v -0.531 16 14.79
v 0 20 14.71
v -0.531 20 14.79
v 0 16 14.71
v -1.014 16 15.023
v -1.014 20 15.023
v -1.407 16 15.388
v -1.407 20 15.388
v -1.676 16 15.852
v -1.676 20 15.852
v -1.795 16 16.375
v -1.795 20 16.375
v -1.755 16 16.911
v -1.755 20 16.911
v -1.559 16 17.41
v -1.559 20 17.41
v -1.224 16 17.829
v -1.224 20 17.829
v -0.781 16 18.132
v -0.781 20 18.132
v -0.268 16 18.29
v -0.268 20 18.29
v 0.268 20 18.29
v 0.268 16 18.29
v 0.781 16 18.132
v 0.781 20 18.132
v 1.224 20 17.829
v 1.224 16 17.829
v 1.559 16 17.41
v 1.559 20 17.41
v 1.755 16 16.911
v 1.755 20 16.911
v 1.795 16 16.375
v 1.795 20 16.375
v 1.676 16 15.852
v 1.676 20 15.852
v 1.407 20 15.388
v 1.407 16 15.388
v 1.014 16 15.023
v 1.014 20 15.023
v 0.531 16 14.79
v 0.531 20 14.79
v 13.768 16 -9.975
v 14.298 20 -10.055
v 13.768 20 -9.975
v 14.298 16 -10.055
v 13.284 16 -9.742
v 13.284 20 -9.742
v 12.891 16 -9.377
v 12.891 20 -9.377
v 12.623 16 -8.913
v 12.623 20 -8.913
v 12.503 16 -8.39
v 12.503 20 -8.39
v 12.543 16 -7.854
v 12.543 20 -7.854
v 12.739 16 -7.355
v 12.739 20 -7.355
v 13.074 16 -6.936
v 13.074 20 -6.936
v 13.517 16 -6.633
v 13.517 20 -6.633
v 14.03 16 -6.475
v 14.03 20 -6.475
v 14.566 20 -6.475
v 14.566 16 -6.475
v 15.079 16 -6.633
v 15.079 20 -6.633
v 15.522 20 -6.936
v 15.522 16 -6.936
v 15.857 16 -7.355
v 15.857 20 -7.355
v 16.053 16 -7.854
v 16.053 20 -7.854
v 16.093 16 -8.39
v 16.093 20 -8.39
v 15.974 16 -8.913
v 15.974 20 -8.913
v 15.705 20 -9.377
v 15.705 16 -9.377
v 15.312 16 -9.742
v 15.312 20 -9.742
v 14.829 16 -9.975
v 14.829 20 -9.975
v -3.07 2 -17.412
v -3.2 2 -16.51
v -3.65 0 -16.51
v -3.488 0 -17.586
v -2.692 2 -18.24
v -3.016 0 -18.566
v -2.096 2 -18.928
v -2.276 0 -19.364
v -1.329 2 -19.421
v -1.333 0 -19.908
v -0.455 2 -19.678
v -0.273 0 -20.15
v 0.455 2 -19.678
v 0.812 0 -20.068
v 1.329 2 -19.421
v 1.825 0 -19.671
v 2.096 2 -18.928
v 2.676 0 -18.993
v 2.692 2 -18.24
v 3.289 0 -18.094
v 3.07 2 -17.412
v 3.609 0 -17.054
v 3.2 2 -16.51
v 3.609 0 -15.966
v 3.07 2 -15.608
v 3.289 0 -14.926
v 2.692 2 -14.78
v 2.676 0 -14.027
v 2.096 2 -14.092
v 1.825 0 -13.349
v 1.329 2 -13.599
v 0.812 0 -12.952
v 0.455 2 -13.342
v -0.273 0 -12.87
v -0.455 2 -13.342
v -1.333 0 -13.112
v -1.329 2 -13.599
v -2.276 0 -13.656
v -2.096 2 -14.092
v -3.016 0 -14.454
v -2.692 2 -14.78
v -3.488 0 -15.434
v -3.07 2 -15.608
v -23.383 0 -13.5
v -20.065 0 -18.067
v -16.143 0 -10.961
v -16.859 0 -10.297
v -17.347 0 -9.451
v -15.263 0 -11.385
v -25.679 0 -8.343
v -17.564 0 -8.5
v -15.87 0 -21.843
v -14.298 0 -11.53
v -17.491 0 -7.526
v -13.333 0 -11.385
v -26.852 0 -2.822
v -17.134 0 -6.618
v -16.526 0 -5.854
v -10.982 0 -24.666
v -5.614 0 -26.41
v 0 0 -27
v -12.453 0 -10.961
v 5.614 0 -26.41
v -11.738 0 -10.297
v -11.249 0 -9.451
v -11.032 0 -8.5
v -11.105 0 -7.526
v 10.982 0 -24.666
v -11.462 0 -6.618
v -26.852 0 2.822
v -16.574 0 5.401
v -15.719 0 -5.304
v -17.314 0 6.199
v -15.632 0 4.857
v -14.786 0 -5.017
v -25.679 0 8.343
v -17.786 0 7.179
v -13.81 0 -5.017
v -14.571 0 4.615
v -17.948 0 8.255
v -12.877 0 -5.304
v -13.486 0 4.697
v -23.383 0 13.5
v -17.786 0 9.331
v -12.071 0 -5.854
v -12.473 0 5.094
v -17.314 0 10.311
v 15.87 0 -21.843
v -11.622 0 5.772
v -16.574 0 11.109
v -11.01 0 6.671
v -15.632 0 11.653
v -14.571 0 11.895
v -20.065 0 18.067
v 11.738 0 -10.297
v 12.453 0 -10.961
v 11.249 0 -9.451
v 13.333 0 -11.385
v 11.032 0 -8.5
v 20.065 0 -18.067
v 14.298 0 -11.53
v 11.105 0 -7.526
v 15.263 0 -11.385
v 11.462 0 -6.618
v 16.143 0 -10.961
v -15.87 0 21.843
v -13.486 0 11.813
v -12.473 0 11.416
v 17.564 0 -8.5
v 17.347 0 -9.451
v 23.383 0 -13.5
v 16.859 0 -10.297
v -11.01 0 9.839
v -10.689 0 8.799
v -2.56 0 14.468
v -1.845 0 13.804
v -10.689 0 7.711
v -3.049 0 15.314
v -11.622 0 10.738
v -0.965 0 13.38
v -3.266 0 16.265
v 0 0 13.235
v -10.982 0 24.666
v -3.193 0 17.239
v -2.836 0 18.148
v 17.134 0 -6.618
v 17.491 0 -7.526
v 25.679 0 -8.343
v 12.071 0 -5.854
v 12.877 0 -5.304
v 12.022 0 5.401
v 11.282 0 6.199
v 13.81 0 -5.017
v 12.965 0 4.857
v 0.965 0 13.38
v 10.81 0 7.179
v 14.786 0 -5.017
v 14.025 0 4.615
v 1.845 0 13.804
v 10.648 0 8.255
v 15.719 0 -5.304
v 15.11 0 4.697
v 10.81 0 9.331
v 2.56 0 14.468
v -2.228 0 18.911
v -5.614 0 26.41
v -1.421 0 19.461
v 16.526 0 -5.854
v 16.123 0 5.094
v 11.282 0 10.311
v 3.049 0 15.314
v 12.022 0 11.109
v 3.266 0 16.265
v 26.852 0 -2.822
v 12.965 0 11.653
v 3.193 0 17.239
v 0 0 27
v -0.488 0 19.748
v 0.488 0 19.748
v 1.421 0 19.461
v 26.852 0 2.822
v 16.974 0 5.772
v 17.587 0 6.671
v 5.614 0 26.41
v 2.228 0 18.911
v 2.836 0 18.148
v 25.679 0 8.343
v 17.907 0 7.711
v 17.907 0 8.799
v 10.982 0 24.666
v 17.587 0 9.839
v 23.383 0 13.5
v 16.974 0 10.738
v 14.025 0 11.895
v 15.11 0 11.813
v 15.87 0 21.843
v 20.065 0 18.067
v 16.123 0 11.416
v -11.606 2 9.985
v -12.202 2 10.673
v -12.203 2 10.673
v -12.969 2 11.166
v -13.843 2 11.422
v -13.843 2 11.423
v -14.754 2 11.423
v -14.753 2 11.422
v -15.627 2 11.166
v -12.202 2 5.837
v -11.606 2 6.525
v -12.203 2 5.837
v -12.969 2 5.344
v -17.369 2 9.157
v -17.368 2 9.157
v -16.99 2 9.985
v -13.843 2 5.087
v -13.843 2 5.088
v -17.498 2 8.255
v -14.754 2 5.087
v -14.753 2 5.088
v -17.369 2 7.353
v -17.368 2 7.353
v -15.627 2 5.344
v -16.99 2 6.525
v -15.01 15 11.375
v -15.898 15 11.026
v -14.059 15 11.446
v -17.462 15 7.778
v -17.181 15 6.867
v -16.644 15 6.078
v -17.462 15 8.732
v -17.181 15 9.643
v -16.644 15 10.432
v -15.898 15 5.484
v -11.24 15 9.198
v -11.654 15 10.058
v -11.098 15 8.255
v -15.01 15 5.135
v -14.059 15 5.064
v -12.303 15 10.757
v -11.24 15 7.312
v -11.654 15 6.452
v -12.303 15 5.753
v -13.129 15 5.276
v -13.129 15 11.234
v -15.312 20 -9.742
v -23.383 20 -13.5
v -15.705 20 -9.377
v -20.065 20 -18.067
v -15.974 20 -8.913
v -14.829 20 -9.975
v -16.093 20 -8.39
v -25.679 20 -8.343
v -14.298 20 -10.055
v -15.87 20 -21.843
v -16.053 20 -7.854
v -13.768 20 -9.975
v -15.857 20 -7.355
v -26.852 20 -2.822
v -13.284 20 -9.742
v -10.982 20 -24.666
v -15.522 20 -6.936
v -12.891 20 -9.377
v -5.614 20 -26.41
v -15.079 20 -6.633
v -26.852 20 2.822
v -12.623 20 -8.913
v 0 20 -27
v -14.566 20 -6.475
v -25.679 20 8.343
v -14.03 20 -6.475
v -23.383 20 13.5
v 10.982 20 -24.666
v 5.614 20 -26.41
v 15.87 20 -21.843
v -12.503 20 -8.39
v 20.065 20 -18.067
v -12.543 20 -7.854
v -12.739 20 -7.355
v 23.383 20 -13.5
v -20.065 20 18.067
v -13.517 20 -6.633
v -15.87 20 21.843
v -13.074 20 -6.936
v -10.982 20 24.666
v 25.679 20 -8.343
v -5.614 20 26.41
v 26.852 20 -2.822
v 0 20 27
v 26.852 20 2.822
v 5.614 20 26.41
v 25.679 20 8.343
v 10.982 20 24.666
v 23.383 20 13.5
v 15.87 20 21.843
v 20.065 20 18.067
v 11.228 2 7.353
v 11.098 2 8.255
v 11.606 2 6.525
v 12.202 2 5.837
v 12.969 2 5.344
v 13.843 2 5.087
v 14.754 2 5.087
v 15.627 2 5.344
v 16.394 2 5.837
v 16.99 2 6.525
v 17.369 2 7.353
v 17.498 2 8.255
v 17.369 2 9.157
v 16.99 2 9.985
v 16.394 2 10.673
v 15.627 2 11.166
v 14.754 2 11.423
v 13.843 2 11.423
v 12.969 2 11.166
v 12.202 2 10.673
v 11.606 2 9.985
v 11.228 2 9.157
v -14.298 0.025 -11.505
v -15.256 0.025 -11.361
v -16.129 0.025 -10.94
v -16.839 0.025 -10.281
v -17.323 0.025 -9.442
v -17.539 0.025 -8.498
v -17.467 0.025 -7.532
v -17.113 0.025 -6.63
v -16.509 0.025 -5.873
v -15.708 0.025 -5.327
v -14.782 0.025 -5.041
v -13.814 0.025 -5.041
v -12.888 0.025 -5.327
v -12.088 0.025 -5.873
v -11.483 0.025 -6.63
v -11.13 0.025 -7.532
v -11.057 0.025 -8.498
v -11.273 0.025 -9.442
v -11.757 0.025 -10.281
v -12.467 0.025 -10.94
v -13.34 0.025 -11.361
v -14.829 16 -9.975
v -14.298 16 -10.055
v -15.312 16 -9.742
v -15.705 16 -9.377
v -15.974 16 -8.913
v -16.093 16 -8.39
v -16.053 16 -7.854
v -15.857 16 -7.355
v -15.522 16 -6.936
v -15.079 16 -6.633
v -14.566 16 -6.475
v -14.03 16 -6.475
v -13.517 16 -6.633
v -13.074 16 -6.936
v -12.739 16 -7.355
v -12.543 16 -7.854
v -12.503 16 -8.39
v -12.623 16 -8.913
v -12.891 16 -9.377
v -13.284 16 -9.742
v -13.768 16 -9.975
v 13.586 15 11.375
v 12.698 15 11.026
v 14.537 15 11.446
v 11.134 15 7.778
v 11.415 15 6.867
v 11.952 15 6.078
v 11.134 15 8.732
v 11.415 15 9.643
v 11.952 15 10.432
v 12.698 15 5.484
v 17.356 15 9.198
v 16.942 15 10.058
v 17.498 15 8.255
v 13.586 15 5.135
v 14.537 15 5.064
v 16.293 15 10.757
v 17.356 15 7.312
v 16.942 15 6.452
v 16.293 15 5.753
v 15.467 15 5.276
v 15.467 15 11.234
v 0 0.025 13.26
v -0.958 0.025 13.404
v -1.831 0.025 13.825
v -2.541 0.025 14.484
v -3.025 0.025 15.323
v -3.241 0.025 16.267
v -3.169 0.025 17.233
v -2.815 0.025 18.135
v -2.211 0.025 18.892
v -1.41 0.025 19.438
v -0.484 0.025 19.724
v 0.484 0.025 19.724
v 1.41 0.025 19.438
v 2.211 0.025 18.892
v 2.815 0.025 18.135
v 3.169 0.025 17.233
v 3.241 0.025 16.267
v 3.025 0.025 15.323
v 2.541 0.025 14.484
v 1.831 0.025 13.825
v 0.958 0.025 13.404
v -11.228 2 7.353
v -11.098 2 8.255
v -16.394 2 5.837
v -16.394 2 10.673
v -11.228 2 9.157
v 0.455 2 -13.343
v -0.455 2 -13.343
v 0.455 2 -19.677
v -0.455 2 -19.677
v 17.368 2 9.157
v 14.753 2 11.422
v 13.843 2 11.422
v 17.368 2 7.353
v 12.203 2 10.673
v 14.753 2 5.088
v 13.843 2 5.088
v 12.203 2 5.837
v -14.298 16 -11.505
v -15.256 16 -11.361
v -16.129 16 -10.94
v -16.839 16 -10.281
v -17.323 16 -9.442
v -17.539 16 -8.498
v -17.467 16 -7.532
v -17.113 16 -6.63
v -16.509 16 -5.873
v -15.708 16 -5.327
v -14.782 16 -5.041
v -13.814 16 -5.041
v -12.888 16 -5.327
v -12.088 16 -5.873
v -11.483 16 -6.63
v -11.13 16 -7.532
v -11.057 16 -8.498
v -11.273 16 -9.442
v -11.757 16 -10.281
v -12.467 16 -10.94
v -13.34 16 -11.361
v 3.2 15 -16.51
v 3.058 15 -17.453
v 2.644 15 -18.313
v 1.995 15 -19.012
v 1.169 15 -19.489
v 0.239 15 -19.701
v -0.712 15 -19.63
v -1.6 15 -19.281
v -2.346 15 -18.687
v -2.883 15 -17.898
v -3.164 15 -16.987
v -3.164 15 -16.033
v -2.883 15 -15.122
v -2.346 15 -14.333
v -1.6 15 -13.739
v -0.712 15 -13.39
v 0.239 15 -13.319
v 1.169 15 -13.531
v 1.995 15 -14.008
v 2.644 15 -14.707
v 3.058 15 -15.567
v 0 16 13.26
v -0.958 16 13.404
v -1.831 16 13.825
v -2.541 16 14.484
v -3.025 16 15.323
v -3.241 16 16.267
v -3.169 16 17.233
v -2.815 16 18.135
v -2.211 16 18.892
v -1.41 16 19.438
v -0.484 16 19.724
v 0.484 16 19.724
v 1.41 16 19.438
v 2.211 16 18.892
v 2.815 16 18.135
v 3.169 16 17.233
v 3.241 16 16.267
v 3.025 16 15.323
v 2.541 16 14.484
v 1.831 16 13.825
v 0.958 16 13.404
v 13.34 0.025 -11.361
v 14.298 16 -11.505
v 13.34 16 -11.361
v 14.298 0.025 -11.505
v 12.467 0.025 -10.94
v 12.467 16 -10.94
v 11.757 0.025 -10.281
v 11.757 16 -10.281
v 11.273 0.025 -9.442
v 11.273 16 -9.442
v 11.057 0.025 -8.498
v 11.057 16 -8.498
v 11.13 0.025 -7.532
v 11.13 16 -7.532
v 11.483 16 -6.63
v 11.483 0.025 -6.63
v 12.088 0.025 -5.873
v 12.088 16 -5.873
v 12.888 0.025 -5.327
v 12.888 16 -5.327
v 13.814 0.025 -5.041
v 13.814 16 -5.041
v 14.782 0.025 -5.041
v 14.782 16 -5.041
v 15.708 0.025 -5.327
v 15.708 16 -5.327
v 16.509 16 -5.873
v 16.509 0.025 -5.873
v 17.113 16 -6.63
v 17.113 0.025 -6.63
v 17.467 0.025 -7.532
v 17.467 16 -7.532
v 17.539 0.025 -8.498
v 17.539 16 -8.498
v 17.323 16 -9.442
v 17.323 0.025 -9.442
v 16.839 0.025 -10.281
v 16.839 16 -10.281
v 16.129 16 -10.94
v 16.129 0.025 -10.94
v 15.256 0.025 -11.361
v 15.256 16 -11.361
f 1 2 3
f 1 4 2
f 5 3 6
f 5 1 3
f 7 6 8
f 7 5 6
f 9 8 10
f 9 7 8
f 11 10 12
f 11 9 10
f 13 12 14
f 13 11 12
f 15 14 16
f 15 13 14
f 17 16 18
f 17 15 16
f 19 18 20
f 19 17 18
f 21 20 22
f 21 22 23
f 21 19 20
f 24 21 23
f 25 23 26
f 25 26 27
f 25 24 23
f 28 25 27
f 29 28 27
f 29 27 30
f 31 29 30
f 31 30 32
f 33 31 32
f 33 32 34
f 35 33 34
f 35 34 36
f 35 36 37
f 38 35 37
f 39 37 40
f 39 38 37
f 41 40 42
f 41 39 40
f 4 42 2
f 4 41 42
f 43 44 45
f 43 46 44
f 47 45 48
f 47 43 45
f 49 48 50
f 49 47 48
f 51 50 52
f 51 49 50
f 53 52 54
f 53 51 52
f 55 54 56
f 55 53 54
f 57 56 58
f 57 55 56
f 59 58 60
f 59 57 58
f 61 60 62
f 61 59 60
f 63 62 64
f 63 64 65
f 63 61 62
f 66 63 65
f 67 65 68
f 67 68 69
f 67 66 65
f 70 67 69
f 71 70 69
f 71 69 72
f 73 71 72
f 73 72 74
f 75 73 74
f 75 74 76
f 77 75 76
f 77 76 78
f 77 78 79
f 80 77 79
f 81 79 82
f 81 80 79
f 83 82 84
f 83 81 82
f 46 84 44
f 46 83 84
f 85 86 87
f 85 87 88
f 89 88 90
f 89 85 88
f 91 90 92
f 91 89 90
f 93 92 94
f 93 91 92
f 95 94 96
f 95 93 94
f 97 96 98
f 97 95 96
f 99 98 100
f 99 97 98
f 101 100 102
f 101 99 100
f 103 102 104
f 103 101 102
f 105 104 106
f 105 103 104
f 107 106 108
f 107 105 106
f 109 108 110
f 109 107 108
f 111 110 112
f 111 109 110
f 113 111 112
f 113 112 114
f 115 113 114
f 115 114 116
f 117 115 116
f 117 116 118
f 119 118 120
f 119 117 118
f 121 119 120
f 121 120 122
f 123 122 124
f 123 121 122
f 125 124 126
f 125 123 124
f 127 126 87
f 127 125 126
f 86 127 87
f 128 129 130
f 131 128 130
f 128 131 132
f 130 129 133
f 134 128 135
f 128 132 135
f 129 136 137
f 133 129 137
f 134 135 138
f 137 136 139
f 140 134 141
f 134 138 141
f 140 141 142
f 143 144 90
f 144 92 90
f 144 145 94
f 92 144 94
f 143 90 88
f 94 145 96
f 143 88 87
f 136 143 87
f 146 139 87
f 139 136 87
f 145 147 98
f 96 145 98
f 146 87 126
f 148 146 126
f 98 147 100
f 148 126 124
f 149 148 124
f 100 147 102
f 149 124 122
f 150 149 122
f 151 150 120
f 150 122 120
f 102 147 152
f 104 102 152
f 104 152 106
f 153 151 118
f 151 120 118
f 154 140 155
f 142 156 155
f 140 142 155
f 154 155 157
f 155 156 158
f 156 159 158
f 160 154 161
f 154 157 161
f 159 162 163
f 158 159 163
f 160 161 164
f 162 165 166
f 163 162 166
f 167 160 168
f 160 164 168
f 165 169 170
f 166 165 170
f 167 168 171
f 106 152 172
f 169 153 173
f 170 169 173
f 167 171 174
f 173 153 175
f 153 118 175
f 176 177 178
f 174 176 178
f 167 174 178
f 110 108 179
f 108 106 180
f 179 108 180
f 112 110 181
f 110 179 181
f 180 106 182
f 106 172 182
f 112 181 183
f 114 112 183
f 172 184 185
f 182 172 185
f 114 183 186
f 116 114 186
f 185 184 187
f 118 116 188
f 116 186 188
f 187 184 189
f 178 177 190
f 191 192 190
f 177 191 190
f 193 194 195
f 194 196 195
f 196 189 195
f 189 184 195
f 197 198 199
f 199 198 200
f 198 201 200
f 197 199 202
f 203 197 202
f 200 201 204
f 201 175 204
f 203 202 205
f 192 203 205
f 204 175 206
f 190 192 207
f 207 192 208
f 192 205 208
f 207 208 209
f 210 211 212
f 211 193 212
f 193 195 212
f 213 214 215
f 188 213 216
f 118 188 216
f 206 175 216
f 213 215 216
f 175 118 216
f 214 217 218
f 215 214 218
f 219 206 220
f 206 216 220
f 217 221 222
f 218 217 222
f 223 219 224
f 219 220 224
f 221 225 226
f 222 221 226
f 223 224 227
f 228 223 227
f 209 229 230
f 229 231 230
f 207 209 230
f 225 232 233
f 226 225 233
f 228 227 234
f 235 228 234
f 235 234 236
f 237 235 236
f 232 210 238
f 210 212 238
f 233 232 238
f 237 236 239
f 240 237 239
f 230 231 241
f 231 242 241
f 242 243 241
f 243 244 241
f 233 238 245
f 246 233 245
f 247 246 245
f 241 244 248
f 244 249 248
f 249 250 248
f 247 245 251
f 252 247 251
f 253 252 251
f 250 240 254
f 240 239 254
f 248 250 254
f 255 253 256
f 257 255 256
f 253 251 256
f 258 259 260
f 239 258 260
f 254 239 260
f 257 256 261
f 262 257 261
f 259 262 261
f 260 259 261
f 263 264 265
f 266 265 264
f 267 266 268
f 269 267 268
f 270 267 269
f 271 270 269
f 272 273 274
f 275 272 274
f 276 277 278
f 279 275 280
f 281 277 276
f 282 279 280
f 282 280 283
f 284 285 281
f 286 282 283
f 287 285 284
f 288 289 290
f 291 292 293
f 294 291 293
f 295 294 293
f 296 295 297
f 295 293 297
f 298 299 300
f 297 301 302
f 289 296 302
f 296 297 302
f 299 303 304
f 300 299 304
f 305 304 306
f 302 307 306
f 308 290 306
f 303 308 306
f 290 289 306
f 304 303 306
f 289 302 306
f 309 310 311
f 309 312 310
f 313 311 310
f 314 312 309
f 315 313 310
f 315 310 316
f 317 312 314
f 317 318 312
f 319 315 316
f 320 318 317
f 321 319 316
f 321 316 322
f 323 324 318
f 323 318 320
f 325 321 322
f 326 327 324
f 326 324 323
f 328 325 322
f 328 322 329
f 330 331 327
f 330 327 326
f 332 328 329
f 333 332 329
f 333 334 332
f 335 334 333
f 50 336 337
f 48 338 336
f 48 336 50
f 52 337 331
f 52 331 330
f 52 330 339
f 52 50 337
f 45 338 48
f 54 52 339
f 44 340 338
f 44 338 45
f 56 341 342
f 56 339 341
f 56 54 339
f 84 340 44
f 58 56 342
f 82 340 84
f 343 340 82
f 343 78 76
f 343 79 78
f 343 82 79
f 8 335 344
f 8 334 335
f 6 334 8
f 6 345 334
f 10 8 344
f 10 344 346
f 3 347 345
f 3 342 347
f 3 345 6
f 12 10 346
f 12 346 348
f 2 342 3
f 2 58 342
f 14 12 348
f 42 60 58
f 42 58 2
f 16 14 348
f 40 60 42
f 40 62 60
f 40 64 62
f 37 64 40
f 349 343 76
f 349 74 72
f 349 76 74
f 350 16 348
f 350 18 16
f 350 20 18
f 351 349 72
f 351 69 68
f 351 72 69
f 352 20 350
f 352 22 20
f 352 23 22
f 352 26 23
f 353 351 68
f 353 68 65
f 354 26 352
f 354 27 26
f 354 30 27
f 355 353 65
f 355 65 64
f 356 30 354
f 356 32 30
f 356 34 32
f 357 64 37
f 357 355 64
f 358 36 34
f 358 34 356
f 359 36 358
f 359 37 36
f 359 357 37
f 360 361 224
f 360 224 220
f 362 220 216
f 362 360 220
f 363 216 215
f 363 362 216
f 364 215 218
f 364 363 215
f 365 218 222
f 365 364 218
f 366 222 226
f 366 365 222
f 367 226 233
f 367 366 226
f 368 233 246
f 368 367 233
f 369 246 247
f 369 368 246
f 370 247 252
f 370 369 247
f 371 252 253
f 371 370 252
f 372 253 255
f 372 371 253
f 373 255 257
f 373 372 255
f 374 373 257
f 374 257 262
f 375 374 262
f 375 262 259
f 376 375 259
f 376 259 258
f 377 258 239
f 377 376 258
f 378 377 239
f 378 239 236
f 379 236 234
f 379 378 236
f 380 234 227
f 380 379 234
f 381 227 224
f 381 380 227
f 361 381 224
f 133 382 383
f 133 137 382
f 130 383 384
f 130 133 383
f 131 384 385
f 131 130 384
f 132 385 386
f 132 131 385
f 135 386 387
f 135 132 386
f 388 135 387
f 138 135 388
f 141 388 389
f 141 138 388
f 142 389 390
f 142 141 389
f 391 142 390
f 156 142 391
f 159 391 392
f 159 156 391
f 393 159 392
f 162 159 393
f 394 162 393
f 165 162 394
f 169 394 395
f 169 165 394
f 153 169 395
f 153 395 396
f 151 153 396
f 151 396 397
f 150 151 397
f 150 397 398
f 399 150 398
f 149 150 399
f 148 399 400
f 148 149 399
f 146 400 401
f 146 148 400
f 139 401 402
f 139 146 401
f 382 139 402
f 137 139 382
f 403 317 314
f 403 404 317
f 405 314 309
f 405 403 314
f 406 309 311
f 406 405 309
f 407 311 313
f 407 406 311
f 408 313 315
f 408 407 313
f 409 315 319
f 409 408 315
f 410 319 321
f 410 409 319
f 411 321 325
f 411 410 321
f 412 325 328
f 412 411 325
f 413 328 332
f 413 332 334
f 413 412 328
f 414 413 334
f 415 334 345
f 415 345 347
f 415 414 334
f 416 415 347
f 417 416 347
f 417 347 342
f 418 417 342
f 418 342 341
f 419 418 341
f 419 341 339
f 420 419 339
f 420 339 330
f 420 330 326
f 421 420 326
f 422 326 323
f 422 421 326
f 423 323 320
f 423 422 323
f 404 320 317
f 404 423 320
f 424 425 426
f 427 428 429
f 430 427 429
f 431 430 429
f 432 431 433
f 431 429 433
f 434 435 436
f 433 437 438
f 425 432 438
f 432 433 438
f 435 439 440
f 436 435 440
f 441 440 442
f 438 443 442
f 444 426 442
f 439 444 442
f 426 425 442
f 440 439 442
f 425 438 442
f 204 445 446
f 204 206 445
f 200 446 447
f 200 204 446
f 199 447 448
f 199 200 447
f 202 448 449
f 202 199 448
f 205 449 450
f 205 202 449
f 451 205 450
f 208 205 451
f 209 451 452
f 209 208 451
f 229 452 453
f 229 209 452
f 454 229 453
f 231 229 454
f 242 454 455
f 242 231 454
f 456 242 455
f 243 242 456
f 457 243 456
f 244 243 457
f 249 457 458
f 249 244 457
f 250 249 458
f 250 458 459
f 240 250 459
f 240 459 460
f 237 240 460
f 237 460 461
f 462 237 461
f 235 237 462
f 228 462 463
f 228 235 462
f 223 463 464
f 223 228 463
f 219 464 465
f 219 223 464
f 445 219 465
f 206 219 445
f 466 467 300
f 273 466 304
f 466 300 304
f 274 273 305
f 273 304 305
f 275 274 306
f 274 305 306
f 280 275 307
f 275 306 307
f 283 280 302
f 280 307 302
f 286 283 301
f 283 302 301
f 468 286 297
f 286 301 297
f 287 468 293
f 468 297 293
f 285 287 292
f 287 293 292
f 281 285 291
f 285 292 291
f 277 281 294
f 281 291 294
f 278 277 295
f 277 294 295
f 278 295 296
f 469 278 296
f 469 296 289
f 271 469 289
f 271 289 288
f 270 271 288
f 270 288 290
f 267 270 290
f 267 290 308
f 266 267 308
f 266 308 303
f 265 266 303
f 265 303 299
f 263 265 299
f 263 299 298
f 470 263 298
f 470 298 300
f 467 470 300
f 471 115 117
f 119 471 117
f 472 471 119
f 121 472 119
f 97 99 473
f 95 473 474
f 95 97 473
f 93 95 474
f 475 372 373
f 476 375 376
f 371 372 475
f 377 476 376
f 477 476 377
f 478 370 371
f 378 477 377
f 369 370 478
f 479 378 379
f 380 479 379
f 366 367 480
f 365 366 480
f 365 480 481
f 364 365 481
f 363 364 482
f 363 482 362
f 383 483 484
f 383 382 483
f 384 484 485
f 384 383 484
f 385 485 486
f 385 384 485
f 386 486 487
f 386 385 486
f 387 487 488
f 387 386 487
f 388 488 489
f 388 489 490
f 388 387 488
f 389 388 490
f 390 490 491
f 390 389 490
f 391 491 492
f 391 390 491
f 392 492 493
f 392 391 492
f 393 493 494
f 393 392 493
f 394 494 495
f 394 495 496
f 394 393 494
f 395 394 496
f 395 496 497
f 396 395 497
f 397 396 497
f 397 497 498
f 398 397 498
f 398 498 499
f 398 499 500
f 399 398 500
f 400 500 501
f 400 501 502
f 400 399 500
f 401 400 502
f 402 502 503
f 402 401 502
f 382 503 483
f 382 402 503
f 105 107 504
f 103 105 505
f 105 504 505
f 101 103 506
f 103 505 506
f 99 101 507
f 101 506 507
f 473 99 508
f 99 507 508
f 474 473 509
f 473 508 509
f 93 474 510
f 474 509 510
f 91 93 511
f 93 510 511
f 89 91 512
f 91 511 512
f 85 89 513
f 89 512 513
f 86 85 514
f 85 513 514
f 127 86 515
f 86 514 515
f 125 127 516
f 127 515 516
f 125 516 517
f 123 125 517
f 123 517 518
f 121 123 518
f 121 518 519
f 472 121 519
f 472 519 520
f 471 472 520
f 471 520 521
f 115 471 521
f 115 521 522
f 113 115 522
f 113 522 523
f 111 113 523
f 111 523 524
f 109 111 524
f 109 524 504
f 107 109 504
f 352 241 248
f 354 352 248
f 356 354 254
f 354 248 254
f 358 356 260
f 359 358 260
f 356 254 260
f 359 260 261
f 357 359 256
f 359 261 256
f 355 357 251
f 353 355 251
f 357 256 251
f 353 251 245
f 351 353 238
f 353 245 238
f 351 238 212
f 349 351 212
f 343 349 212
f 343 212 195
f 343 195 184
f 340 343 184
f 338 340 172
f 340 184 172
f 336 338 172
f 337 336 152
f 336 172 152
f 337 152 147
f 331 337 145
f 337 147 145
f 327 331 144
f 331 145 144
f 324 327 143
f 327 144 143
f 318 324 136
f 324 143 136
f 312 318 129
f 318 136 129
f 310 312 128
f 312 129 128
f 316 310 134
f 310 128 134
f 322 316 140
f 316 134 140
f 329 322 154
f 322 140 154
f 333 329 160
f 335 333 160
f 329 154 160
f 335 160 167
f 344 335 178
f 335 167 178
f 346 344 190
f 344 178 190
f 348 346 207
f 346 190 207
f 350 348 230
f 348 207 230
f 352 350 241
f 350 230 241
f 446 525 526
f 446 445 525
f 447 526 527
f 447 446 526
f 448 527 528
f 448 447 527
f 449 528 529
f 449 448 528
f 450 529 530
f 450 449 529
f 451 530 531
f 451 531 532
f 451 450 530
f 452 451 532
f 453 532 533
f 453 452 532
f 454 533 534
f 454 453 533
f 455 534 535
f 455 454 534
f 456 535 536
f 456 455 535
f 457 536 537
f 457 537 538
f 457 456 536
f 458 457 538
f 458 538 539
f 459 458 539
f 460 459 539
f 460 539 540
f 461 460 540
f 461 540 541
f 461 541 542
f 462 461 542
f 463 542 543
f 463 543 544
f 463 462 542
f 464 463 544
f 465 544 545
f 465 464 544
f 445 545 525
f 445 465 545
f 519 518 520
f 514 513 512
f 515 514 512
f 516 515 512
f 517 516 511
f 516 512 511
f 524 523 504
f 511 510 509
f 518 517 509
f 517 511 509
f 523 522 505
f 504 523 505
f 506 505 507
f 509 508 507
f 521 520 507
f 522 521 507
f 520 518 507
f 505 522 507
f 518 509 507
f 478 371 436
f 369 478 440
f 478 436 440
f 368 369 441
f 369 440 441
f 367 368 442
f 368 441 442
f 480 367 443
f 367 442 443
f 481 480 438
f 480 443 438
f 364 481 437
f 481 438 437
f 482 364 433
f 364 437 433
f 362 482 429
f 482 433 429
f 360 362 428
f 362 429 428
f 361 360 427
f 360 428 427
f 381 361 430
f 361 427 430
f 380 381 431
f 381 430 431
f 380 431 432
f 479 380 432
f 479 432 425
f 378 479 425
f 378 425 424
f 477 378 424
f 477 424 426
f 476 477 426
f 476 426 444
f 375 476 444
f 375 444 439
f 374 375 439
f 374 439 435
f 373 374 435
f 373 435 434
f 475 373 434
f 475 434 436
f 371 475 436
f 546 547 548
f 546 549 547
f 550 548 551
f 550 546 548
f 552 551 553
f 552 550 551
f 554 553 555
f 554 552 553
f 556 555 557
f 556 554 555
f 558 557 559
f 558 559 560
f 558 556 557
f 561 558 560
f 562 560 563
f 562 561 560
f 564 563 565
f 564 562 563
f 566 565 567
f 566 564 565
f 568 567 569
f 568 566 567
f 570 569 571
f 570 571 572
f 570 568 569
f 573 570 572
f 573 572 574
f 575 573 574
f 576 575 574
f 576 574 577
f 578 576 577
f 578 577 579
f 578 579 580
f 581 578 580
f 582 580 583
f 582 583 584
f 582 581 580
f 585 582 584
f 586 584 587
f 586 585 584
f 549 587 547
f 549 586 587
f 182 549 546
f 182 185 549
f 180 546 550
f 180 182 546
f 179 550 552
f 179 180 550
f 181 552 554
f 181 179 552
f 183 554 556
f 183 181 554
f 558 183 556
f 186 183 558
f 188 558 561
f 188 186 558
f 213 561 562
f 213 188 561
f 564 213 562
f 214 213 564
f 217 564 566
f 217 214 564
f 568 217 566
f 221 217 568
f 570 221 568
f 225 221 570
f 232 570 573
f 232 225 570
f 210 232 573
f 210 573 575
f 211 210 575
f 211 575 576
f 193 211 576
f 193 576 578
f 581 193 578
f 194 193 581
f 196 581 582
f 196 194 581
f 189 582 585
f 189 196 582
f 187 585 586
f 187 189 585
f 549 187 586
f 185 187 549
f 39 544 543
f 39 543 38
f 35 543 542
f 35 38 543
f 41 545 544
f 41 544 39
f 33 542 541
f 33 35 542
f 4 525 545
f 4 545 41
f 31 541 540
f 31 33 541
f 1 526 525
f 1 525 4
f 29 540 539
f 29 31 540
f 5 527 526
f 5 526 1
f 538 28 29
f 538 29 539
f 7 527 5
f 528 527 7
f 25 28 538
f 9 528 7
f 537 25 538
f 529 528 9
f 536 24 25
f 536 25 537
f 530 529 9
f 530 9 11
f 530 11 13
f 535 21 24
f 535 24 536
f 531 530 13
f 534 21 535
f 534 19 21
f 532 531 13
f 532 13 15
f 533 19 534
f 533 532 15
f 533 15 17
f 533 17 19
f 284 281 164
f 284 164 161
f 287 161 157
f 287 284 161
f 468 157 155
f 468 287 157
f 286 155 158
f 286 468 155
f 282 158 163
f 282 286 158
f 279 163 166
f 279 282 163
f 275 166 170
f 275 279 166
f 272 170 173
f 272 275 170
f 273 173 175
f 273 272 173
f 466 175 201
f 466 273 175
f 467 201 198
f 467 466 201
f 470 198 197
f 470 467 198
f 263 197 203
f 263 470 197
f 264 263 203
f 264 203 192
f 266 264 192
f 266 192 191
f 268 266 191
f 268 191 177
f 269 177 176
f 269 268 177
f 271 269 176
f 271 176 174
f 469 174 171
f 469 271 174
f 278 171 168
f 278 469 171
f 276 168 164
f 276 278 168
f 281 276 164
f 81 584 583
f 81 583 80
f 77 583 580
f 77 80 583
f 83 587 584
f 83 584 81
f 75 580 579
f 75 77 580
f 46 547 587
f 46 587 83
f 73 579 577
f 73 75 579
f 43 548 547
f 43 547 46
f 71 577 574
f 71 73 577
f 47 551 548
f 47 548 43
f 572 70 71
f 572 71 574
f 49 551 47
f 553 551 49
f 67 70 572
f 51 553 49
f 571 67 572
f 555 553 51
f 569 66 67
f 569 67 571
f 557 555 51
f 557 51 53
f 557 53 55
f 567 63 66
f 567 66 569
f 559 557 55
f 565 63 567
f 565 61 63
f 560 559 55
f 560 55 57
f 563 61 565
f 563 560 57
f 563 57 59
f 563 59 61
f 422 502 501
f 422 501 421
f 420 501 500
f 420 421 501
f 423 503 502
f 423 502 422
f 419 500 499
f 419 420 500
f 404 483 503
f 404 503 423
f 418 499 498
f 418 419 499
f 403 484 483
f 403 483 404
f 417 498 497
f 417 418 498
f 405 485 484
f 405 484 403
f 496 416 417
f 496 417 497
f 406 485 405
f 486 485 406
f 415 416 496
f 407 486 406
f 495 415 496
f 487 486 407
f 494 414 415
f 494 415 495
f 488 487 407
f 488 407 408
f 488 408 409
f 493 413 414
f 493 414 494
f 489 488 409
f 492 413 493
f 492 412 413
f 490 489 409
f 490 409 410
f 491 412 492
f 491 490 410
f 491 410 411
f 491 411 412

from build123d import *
from OCP.BRepFilletAPI import BRepFilletAPI_MakeChamfer

# Parameters (mm, degrees)
SKETCH2_R                     = 27
BOSS_EXTRUDE2_DEPTH           = 20
CBORE_FOR_M3_SHCS1_AT_2_COUNT = 2
CBORE_FOR_M3_SHCS1_AT_2_PITCH = 28.596158833
CBORE_FOR_M3_SHCS1_AT_3_COUNT = 2
CBORE_FOR_M3_SHCS1_AT_3_PITCH = 28.596158833
HOLE1_D                       = 6.4
HOLE1_DEPTH                   = 15
HOLE1_CBORE_D                 = 7.3
HOLE1_CBORE_DEPTH             = 2
CHAMFER1_SIZE                 = 2
CHAMFER1_SIZE_2               = 0.45


with BuildPart() as part:
    # Sketch2 → Boss-Extrude2 (new body)
    with BuildSketch(Plane(origin=(0, 0, 0), x_dir=(1, 0, 0), z_dir=(0, 1, 0))):
        with Locations(Location((0, 0, 0), (0, 0, 270))):
            Circle(SKETCH2_R)
    extrude(amount=BOSS_EXTRUDE2_DEPTH)

    # Sketch5 → CBORE for M3 SHCS1 (revolve, cut)
    with BuildSketch(Plane(origin=(0, 0, 16.51), x_dir=(0, 0, -1), z_dir=(1, 0, 0))):
        Polygon((0, 0), (0, 20), (1.8, 20), (1.8, 16), (3.25, 16), (3.25, 0.025), (3.275, 0), align=None)
    cbore_for_m3_shcs1 = revolve(axis=Axis((0, -6.35, 16.51), (0, 1, 0)), mode=Mode.SUBTRACT)

    # CBORE for M3 SHCS1 at 2: CBORE for M3 SHCS1 ×2
    with Locations(*[Vector(0.5000000000000012, 0, -0.8660254037844379) * (i * CBORE_FOR_M3_SHCS1_AT_2_PITCH) for i in range(1, CBORE_FOR_M3_SHCS1_AT_2_COUNT)]):
        add(cbore_for_m3_shcs1, mode=Mode.SUBTRACT)

    # CBORE for M3 SHCS1 at 3: CBORE for M3 SHCS1 ×2
    with Locations(*[Vector(-0.4999999999999978, 0, -0.8660254037844399) * (i * CBORE_FOR_M3_SHCS1_AT_3_PITCH) for i in range(1, CBORE_FOR_M3_SHCS1_AT_3_COUNT)]):
        add(cbore_for_m3_shcs1, mode=Mode.SUBTRACT)

    # Hole1
    with Locations(Plane(origin=(0, 0, 0), x_dir=(-1, 0, 0), z_dir=(0, -1, 0))):
        with Locations((14.298079416, -8.255), (0, 16.51), (-14.298079416, -8.255)):
            CounterBoreHole(HOLE1_D / 2, HOLE1_CBORE_D / 2, HOLE1_CBORE_DEPTH, depth=HOLE1_DEPTH)

    # Chamfer1
    chamfer1_edges_1 = [part.edges().sort_by_distance(p)[0] for p in [
        (17.948079416, 2, 8.255),
    ]]
    chamfer1_side_1 = [part.faces().sort_by_distance(p)[0] for p in [
        (17.948079416, 1.991, 8.255),
    ]]
    chamfer1_edges_2 = [part.edges().sort_by_distance(p)[0] for p in [
        (3.65, 2, -16.51),
    ]]
    chamfer1_side_2 = [part.faces().sort_by_distance(p)[0] for p in [
        (3.65, 1.991, -16.51),
    ]]
    chamfer1_edges_3 = [part.edges().sort_by_distance(p)[0] for p in [
        (-10.648079416, 2, 8.255),
    ]]
    chamfer1_side_3 = [part.faces().sort_by_distance(p)[0] for p in [
        (-10.648079416, 1.991, 8.255),
    ]]
    chamfer1 = BRepFilletAPI_MakeChamfer(part.part.solid().wrapped)
    for e in chamfer1_edges_1:
        chamfer1.Add(CHAMFER1_SIZE - 0.0001, CHAMFER1_SIZE_2 - 0.0001, e.wrapped, chamfer1_side_1[0].wrapped)
    for e in chamfer1_edges_2:
        chamfer1.Add(CHAMFER1_SIZE - 0.0001, CHAMFER1_SIZE_2 - 0.0001, e.wrapped, chamfer1_side_2[0].wrapped)
    for e in chamfer1_edges_3:
        chamfer1.Add(CHAMFER1_SIZE - 0.0001, CHAMFER1_SIZE_2 - 0.0001, e.wrapped, chamfer1_side_3[0].wrapped)
    add(Compound.cast(chamfer1.Shape()), mode=Mode.REPLACE)  # a hair under: the kernel refuses the full size


solid = part.part
